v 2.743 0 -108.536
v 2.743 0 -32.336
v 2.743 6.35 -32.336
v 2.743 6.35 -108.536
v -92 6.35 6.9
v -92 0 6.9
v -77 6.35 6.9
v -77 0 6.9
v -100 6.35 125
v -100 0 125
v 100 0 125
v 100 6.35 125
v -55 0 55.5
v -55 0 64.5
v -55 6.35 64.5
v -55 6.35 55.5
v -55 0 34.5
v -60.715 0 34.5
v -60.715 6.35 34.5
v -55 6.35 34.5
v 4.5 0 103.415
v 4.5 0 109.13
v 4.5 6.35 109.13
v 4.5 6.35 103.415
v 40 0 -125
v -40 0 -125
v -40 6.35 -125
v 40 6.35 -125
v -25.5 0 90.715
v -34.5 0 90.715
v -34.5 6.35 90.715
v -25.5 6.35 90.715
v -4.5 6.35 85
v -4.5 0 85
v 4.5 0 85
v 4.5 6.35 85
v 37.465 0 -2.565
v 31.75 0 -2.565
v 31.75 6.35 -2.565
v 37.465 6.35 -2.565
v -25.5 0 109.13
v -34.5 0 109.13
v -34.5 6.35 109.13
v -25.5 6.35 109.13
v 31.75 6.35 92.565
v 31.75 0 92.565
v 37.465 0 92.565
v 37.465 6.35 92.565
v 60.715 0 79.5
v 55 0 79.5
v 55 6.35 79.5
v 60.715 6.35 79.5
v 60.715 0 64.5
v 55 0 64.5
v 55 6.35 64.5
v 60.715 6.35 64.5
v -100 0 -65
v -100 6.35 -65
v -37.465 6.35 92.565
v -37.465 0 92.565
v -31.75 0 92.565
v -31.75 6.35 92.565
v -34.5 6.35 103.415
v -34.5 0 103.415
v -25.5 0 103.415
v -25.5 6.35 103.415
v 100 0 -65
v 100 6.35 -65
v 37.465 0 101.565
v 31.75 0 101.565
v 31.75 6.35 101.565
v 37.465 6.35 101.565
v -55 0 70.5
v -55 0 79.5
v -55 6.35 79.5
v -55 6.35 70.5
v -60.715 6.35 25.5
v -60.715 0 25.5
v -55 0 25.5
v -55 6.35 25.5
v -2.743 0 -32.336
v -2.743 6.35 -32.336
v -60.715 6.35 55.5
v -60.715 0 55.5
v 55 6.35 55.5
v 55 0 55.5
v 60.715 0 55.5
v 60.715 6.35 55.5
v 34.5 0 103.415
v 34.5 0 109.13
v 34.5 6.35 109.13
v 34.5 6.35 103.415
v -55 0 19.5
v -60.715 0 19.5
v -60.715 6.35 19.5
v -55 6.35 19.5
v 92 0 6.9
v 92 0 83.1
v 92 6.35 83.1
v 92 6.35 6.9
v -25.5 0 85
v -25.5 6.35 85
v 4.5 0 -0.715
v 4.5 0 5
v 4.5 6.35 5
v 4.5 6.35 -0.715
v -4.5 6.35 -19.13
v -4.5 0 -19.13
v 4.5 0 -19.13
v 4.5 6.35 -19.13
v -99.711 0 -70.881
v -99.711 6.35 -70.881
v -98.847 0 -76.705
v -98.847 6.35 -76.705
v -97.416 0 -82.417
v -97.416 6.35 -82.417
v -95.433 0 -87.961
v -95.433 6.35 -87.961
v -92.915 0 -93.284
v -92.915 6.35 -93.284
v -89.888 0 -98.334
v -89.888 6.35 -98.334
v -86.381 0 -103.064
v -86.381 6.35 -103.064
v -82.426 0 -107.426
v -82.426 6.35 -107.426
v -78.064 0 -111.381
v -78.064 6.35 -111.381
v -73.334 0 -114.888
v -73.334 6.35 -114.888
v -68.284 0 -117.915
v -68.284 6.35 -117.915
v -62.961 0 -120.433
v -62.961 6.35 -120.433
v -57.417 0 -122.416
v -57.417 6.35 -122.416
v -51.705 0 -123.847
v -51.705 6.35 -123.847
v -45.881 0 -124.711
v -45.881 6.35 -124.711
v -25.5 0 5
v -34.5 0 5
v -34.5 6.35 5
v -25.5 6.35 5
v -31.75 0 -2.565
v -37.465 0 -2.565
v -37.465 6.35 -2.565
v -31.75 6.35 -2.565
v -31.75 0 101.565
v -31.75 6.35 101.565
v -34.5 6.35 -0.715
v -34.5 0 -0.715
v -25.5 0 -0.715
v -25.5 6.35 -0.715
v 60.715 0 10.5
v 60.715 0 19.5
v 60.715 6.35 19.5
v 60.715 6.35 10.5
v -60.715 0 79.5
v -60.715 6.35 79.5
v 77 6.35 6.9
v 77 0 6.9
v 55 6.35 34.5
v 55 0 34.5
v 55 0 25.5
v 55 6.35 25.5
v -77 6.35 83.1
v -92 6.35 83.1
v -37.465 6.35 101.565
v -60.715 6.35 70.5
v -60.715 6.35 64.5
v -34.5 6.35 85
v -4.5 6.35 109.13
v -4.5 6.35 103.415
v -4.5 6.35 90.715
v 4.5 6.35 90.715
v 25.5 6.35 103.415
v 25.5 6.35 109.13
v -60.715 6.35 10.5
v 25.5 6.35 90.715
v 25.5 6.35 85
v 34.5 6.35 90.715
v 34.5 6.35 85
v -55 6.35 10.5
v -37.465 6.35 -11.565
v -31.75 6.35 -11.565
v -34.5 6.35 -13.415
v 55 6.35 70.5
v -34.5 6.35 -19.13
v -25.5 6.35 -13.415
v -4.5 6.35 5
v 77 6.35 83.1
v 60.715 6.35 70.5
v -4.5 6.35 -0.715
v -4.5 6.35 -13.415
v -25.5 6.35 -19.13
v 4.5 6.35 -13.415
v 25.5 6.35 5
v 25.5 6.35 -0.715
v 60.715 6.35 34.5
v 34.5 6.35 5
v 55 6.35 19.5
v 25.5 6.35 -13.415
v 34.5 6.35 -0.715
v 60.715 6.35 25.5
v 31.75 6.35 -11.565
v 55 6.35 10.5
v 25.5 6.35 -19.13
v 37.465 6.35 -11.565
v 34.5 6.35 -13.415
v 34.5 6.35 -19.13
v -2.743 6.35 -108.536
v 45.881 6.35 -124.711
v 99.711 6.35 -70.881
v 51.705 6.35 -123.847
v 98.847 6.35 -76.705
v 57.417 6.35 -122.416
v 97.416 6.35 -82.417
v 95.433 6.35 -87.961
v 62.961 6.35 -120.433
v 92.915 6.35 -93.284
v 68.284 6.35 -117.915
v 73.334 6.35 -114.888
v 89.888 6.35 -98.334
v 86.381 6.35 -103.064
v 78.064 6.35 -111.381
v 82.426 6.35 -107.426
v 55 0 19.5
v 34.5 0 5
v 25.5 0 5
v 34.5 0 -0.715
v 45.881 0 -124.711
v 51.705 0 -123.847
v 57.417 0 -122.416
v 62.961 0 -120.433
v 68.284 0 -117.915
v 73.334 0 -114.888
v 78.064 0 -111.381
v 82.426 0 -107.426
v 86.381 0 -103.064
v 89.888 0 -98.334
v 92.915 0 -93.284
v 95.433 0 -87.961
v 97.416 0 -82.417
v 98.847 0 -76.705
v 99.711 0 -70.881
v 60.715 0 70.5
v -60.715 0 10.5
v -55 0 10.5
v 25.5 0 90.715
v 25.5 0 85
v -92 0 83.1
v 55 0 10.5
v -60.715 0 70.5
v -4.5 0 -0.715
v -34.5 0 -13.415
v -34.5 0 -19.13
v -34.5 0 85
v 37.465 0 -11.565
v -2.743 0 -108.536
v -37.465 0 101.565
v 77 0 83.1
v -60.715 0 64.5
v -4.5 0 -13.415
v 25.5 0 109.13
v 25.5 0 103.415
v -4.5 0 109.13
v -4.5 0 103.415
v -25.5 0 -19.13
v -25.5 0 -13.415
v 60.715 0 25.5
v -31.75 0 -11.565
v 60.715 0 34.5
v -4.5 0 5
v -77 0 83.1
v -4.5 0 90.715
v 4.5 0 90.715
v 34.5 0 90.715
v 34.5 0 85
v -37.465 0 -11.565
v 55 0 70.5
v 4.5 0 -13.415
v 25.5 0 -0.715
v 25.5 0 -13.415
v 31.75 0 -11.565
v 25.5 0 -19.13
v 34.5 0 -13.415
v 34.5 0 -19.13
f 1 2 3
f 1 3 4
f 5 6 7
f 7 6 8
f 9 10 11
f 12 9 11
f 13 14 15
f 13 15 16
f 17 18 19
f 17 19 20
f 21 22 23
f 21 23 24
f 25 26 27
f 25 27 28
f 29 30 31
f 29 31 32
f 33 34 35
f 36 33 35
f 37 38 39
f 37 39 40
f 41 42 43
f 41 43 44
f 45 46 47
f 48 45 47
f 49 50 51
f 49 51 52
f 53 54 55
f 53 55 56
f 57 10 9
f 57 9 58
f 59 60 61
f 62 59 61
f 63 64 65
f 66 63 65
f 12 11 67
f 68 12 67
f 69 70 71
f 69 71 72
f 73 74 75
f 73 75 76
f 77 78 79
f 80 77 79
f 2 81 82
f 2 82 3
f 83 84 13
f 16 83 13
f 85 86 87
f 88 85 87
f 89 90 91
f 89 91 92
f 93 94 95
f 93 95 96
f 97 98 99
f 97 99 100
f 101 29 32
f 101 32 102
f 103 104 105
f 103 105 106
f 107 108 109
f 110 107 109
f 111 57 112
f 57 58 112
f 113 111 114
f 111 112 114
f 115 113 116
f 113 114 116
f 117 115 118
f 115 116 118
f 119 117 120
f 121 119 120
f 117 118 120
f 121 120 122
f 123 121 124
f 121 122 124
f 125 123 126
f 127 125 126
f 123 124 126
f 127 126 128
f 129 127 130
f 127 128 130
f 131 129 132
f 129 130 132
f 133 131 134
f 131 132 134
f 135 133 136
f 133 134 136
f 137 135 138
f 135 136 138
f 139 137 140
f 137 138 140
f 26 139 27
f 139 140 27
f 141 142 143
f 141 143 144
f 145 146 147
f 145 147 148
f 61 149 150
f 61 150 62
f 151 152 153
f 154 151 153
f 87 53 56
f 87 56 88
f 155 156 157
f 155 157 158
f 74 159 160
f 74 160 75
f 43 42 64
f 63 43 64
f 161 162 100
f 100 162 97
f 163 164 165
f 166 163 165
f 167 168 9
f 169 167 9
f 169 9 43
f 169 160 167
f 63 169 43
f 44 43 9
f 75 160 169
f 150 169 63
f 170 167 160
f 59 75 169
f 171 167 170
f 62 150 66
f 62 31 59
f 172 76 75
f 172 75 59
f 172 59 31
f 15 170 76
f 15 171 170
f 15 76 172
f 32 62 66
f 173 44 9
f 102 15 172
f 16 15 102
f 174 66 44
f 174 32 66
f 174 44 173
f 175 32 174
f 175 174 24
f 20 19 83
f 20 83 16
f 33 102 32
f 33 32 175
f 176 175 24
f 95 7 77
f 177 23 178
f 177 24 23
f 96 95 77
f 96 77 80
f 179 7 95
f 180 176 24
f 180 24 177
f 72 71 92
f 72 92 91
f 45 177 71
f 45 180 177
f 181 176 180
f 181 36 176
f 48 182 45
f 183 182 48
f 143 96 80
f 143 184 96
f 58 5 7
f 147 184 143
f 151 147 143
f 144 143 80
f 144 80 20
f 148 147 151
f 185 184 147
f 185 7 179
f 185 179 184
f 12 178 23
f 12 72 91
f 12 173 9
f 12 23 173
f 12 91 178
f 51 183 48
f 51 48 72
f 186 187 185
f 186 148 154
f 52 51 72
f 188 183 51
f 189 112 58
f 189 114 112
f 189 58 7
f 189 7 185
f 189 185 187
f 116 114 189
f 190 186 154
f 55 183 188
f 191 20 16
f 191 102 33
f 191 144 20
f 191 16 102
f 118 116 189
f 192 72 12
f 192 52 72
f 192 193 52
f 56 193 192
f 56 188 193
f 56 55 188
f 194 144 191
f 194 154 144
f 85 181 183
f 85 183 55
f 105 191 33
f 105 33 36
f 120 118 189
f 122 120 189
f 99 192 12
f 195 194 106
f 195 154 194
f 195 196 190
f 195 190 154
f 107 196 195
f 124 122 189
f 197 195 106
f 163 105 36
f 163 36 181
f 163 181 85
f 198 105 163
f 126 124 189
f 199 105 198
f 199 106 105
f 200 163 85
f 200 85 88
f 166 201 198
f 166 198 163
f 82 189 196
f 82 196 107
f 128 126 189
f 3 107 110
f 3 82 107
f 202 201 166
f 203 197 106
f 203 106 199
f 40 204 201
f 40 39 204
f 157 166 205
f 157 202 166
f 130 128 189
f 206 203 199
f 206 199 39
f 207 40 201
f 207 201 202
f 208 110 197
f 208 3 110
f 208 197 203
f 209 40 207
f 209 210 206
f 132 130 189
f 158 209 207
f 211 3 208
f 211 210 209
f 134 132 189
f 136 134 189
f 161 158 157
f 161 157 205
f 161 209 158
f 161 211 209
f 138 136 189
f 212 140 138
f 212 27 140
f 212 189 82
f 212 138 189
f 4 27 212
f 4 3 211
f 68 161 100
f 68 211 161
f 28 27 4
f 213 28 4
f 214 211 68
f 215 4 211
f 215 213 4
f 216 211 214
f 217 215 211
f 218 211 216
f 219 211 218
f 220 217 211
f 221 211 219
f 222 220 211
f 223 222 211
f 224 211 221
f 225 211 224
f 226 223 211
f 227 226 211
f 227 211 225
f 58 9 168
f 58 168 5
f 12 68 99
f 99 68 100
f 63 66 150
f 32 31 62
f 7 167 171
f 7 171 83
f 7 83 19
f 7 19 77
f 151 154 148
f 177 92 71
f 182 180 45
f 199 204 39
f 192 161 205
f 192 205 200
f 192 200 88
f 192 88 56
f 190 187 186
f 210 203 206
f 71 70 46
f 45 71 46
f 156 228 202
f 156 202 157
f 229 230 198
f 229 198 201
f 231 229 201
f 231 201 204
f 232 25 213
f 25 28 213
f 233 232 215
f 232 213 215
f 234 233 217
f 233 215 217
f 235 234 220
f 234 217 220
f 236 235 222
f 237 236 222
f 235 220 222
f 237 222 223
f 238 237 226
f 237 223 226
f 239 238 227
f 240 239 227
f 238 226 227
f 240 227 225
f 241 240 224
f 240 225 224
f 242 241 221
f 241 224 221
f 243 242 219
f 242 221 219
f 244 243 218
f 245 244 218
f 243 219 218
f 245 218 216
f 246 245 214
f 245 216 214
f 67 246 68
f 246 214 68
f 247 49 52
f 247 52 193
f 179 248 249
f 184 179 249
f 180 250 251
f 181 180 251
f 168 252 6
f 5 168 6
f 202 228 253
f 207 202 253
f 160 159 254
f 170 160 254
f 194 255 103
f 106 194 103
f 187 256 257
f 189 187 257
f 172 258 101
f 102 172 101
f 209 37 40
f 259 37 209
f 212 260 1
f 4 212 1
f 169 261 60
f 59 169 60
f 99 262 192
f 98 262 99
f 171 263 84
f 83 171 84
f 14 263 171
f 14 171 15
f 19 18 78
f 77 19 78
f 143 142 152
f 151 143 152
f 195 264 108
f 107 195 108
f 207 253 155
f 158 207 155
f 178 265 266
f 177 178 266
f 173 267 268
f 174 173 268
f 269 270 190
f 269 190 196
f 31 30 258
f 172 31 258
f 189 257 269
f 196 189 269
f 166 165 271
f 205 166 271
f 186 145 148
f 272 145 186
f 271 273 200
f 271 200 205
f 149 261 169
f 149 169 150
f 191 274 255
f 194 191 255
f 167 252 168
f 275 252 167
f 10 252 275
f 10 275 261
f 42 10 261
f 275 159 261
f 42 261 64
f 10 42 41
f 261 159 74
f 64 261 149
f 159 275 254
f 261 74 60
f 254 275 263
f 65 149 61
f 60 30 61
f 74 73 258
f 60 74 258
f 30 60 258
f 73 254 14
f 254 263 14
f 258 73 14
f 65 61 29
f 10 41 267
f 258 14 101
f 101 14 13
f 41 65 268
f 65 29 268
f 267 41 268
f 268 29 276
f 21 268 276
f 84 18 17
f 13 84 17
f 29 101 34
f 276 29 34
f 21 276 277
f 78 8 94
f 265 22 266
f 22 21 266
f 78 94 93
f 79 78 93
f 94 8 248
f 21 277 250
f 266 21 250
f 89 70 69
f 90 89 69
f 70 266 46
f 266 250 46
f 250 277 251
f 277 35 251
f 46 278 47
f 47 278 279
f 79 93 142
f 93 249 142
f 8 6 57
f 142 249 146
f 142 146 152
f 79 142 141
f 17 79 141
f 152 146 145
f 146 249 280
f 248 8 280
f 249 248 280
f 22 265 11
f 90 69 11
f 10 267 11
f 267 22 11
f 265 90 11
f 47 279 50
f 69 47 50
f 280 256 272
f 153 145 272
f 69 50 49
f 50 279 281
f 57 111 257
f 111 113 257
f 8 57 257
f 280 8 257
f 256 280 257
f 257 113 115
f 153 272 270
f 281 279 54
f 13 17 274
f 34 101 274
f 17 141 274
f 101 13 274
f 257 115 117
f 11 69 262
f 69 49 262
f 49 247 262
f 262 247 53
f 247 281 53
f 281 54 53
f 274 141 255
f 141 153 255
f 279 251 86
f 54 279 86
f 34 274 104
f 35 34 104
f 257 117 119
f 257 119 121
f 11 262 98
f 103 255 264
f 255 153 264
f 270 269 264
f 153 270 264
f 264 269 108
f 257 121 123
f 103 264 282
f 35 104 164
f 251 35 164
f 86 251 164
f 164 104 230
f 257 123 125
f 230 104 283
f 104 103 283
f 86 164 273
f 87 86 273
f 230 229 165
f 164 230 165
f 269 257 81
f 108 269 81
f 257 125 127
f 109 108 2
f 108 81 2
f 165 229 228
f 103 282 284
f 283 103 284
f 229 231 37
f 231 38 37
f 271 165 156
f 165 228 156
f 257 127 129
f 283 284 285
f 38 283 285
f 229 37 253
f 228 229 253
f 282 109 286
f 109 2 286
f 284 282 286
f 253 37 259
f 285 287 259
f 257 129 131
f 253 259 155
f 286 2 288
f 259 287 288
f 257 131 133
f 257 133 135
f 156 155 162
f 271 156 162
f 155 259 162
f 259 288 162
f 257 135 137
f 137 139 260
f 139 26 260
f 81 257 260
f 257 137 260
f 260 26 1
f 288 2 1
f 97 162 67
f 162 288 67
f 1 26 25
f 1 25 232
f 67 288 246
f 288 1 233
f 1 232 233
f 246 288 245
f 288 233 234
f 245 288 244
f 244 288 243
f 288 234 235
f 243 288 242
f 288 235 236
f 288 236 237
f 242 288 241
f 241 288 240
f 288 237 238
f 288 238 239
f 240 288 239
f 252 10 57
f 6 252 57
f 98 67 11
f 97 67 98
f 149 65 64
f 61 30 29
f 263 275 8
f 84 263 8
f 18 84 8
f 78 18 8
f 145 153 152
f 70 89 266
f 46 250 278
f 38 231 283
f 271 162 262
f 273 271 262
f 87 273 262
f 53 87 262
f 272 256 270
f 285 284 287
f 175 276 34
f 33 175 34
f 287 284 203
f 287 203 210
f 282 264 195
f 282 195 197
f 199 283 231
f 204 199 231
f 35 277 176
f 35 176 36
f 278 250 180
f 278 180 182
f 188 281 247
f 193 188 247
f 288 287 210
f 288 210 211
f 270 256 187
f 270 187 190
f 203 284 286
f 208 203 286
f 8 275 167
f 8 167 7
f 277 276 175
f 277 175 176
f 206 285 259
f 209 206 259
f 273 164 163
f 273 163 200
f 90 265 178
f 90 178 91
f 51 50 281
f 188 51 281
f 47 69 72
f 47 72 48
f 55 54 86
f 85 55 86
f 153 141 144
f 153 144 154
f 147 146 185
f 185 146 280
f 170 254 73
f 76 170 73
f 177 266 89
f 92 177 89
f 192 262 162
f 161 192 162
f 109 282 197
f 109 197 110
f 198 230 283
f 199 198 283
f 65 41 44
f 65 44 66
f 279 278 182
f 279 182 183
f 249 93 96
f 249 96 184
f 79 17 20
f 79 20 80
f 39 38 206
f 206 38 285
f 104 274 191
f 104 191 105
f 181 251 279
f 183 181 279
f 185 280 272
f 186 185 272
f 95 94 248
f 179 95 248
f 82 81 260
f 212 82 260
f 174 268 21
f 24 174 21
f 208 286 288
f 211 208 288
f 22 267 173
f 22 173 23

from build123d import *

# Parameters (mm, degrees)
SKETCH1_W           = 200
SKETCH1_H           = 250
SKETCH1_W_2         = 5.4862609
SKETCH1_H_2         = 76.2
SKETCH1_W_3         = 5.715
SKETCH1_H_3         = 9
SKETCH1_W_4         = 9
SKETCH1_H_4         = 5.715
SKETCH1_W_5         = 15
BOSS_EXTRUDE1_DEPTH = 6.35
FILLET1_R           = 60


with BuildPart() as part:
    # Sketch1 → Boss-Extrude1 (new body)
    with BuildSketch(Plane(origin=(0, 0, 0), x_dir=(1, 0, 0), z_dir=(0, 1, 0))):
        Rectangle(SKETCH1_W, SKETCH1_H)
        with Locations((0, 70.435892683)):
            Rectangle(SKETCH1_W_2, SKETCH1_H_2, mode=Mode.SUBTRACT)
        with Locations((57.8575, -60)):
            Rectangle(SKETCH1_W_3, SKETCH1_H_3, mode=Mode.SUBTRACT)
        with Locations((57.8575, -30)):
            Rectangle(SKETCH1_W_3, SKETCH1_H_3, mode=Mode.SUBTRACT)
        with Locations((0, -87.8575)):
            Rectangle(SKETCH1_W_4, SKETCH1_H_4, mode=Mode.SUBTRACT)
        with Locations((-57.8575, -60)):
            Rectangle(SKETCH1_W_3, SKETCH1_H_3, mode=Mode.SUBTRACT)
        with Locations((-57.8575, -30)):
            Rectangle(SKETCH1_W_3, SKETCH1_H_3, mode=Mode.SUBTRACT)
        with Locations((30, -87.8575)):
            Rectangle(SKETCH1_W_4, SKETCH1_H_4, mode=Mode.SUBTRACT)
        with Locations((-84.5, -45)):
            Rectangle(SKETCH1_W_5, SKETCH1_H_2, mode=Mode.SUBTRACT)
        with Locations((-30, -87.8575)):
            Rectangle(SKETCH1_W_4, SKETCH1_H_4, mode=Mode.SUBTRACT)
        with Locations((30, -106.2725)):
            Rectangle(SKETCH1_W_4, SKETCH1_H_4, mode=Mode.SUBTRACT)
        with Locations((0, -106.2725)):
            Rectangle(SKETCH1_W_4, SKETCH1_H_4, mode=Mode.SUBTRACT)
        with Locations((-30, -106.2725)):
            Rectangle(SKETCH1_W_4, SKETCH1_H_4, mode=Mode.SUBTRACT)
        with Locations((0, -2.1425)):
            Rectangle(SKETCH1_W_4, SKETCH1_H_4, mode=Mode.SUBTRACT)
        with Locations((30, -2.1425)):
            Rectangle(SKETCH1_W_4, SKETCH1_H_4, mode=Mode.SUBTRACT)
        with Locations((30, 16.2725)):
            Rectangle(SKETCH1_W_4, SKETCH1_H_4, mode=Mode.SUBTRACT)
        with Locations((0, 16.2725)):
            Rectangle(SKETCH1_W_4, SKETCH1_H_4, mode=Mode.SUBTRACT)
        with Locations((-30, 16.2725)):
            Rectangle(SKETCH1_W_4, SKETCH1_H_4, mode=Mode.SUBTRACT)
        with Locations((-30, -2.1425)):
            Rectangle(SKETCH1_W_4, SKETCH1_H_4, mode=Mode.SUBTRACT)
        with Locations((84.5, -45)):
            Rectangle(SKETCH1_W_5, SKETCH1_H_2, mode=Mode.SUBTRACT)
        with Locations((57.8575, -75)):
            Rectangle(SKETCH1_W_3, SKETCH1_H_3, mode=Mode.SUBTRACT)
        with Locations((-57.8575, -75)):
            Rectangle(SKETCH1_W_3, SKETCH1_H_3, mode=Mode.SUBTRACT)
        with Locations((57.8575, -15)):
            Rectangle(SKETCH1_W_3, SKETCH1_H_3, mode=Mode.SUBTRACT)
        with Locations((-57.8575, -15)):
            Rectangle(SKETCH1_W_3, SKETCH1_H_3, mode=Mode.SUBTRACT)
        with Locations((34.6075, -97.065)):
            Rectangle(SKETCH1_W_3, SKETCH1_H_3, mode=Mode.SUBTRACT)
        with Locations((-34.6075, -97.065)):
            Rectangle(SKETCH1_W_3, SKETCH1_H_3, mode=Mode.SUBTRACT)
        with Locations((34.6075, 7.065)):
            Rectangle(SKETCH1_W_3, SKETCH1_H_3, mode=Mode.SUBTRACT)
        with Locations((-34.6075, 7.065)):
            Rectangle(SKETCH1_W_3, SKETCH1_H_3, mode=Mode.SUBTRACT)
    extrude(amount=BOSS_EXTRUDE1_DEPTH)

    # Fillet1
    fillet1_edges = [part.edges().sort_by_distance(p)[0] for p in [
        (-100, 3.175, -125),
        (100, 3.175, -125),
    ]]
    fillet(fillet1_edges, radius=FILLET1_R)


solid = part.part
